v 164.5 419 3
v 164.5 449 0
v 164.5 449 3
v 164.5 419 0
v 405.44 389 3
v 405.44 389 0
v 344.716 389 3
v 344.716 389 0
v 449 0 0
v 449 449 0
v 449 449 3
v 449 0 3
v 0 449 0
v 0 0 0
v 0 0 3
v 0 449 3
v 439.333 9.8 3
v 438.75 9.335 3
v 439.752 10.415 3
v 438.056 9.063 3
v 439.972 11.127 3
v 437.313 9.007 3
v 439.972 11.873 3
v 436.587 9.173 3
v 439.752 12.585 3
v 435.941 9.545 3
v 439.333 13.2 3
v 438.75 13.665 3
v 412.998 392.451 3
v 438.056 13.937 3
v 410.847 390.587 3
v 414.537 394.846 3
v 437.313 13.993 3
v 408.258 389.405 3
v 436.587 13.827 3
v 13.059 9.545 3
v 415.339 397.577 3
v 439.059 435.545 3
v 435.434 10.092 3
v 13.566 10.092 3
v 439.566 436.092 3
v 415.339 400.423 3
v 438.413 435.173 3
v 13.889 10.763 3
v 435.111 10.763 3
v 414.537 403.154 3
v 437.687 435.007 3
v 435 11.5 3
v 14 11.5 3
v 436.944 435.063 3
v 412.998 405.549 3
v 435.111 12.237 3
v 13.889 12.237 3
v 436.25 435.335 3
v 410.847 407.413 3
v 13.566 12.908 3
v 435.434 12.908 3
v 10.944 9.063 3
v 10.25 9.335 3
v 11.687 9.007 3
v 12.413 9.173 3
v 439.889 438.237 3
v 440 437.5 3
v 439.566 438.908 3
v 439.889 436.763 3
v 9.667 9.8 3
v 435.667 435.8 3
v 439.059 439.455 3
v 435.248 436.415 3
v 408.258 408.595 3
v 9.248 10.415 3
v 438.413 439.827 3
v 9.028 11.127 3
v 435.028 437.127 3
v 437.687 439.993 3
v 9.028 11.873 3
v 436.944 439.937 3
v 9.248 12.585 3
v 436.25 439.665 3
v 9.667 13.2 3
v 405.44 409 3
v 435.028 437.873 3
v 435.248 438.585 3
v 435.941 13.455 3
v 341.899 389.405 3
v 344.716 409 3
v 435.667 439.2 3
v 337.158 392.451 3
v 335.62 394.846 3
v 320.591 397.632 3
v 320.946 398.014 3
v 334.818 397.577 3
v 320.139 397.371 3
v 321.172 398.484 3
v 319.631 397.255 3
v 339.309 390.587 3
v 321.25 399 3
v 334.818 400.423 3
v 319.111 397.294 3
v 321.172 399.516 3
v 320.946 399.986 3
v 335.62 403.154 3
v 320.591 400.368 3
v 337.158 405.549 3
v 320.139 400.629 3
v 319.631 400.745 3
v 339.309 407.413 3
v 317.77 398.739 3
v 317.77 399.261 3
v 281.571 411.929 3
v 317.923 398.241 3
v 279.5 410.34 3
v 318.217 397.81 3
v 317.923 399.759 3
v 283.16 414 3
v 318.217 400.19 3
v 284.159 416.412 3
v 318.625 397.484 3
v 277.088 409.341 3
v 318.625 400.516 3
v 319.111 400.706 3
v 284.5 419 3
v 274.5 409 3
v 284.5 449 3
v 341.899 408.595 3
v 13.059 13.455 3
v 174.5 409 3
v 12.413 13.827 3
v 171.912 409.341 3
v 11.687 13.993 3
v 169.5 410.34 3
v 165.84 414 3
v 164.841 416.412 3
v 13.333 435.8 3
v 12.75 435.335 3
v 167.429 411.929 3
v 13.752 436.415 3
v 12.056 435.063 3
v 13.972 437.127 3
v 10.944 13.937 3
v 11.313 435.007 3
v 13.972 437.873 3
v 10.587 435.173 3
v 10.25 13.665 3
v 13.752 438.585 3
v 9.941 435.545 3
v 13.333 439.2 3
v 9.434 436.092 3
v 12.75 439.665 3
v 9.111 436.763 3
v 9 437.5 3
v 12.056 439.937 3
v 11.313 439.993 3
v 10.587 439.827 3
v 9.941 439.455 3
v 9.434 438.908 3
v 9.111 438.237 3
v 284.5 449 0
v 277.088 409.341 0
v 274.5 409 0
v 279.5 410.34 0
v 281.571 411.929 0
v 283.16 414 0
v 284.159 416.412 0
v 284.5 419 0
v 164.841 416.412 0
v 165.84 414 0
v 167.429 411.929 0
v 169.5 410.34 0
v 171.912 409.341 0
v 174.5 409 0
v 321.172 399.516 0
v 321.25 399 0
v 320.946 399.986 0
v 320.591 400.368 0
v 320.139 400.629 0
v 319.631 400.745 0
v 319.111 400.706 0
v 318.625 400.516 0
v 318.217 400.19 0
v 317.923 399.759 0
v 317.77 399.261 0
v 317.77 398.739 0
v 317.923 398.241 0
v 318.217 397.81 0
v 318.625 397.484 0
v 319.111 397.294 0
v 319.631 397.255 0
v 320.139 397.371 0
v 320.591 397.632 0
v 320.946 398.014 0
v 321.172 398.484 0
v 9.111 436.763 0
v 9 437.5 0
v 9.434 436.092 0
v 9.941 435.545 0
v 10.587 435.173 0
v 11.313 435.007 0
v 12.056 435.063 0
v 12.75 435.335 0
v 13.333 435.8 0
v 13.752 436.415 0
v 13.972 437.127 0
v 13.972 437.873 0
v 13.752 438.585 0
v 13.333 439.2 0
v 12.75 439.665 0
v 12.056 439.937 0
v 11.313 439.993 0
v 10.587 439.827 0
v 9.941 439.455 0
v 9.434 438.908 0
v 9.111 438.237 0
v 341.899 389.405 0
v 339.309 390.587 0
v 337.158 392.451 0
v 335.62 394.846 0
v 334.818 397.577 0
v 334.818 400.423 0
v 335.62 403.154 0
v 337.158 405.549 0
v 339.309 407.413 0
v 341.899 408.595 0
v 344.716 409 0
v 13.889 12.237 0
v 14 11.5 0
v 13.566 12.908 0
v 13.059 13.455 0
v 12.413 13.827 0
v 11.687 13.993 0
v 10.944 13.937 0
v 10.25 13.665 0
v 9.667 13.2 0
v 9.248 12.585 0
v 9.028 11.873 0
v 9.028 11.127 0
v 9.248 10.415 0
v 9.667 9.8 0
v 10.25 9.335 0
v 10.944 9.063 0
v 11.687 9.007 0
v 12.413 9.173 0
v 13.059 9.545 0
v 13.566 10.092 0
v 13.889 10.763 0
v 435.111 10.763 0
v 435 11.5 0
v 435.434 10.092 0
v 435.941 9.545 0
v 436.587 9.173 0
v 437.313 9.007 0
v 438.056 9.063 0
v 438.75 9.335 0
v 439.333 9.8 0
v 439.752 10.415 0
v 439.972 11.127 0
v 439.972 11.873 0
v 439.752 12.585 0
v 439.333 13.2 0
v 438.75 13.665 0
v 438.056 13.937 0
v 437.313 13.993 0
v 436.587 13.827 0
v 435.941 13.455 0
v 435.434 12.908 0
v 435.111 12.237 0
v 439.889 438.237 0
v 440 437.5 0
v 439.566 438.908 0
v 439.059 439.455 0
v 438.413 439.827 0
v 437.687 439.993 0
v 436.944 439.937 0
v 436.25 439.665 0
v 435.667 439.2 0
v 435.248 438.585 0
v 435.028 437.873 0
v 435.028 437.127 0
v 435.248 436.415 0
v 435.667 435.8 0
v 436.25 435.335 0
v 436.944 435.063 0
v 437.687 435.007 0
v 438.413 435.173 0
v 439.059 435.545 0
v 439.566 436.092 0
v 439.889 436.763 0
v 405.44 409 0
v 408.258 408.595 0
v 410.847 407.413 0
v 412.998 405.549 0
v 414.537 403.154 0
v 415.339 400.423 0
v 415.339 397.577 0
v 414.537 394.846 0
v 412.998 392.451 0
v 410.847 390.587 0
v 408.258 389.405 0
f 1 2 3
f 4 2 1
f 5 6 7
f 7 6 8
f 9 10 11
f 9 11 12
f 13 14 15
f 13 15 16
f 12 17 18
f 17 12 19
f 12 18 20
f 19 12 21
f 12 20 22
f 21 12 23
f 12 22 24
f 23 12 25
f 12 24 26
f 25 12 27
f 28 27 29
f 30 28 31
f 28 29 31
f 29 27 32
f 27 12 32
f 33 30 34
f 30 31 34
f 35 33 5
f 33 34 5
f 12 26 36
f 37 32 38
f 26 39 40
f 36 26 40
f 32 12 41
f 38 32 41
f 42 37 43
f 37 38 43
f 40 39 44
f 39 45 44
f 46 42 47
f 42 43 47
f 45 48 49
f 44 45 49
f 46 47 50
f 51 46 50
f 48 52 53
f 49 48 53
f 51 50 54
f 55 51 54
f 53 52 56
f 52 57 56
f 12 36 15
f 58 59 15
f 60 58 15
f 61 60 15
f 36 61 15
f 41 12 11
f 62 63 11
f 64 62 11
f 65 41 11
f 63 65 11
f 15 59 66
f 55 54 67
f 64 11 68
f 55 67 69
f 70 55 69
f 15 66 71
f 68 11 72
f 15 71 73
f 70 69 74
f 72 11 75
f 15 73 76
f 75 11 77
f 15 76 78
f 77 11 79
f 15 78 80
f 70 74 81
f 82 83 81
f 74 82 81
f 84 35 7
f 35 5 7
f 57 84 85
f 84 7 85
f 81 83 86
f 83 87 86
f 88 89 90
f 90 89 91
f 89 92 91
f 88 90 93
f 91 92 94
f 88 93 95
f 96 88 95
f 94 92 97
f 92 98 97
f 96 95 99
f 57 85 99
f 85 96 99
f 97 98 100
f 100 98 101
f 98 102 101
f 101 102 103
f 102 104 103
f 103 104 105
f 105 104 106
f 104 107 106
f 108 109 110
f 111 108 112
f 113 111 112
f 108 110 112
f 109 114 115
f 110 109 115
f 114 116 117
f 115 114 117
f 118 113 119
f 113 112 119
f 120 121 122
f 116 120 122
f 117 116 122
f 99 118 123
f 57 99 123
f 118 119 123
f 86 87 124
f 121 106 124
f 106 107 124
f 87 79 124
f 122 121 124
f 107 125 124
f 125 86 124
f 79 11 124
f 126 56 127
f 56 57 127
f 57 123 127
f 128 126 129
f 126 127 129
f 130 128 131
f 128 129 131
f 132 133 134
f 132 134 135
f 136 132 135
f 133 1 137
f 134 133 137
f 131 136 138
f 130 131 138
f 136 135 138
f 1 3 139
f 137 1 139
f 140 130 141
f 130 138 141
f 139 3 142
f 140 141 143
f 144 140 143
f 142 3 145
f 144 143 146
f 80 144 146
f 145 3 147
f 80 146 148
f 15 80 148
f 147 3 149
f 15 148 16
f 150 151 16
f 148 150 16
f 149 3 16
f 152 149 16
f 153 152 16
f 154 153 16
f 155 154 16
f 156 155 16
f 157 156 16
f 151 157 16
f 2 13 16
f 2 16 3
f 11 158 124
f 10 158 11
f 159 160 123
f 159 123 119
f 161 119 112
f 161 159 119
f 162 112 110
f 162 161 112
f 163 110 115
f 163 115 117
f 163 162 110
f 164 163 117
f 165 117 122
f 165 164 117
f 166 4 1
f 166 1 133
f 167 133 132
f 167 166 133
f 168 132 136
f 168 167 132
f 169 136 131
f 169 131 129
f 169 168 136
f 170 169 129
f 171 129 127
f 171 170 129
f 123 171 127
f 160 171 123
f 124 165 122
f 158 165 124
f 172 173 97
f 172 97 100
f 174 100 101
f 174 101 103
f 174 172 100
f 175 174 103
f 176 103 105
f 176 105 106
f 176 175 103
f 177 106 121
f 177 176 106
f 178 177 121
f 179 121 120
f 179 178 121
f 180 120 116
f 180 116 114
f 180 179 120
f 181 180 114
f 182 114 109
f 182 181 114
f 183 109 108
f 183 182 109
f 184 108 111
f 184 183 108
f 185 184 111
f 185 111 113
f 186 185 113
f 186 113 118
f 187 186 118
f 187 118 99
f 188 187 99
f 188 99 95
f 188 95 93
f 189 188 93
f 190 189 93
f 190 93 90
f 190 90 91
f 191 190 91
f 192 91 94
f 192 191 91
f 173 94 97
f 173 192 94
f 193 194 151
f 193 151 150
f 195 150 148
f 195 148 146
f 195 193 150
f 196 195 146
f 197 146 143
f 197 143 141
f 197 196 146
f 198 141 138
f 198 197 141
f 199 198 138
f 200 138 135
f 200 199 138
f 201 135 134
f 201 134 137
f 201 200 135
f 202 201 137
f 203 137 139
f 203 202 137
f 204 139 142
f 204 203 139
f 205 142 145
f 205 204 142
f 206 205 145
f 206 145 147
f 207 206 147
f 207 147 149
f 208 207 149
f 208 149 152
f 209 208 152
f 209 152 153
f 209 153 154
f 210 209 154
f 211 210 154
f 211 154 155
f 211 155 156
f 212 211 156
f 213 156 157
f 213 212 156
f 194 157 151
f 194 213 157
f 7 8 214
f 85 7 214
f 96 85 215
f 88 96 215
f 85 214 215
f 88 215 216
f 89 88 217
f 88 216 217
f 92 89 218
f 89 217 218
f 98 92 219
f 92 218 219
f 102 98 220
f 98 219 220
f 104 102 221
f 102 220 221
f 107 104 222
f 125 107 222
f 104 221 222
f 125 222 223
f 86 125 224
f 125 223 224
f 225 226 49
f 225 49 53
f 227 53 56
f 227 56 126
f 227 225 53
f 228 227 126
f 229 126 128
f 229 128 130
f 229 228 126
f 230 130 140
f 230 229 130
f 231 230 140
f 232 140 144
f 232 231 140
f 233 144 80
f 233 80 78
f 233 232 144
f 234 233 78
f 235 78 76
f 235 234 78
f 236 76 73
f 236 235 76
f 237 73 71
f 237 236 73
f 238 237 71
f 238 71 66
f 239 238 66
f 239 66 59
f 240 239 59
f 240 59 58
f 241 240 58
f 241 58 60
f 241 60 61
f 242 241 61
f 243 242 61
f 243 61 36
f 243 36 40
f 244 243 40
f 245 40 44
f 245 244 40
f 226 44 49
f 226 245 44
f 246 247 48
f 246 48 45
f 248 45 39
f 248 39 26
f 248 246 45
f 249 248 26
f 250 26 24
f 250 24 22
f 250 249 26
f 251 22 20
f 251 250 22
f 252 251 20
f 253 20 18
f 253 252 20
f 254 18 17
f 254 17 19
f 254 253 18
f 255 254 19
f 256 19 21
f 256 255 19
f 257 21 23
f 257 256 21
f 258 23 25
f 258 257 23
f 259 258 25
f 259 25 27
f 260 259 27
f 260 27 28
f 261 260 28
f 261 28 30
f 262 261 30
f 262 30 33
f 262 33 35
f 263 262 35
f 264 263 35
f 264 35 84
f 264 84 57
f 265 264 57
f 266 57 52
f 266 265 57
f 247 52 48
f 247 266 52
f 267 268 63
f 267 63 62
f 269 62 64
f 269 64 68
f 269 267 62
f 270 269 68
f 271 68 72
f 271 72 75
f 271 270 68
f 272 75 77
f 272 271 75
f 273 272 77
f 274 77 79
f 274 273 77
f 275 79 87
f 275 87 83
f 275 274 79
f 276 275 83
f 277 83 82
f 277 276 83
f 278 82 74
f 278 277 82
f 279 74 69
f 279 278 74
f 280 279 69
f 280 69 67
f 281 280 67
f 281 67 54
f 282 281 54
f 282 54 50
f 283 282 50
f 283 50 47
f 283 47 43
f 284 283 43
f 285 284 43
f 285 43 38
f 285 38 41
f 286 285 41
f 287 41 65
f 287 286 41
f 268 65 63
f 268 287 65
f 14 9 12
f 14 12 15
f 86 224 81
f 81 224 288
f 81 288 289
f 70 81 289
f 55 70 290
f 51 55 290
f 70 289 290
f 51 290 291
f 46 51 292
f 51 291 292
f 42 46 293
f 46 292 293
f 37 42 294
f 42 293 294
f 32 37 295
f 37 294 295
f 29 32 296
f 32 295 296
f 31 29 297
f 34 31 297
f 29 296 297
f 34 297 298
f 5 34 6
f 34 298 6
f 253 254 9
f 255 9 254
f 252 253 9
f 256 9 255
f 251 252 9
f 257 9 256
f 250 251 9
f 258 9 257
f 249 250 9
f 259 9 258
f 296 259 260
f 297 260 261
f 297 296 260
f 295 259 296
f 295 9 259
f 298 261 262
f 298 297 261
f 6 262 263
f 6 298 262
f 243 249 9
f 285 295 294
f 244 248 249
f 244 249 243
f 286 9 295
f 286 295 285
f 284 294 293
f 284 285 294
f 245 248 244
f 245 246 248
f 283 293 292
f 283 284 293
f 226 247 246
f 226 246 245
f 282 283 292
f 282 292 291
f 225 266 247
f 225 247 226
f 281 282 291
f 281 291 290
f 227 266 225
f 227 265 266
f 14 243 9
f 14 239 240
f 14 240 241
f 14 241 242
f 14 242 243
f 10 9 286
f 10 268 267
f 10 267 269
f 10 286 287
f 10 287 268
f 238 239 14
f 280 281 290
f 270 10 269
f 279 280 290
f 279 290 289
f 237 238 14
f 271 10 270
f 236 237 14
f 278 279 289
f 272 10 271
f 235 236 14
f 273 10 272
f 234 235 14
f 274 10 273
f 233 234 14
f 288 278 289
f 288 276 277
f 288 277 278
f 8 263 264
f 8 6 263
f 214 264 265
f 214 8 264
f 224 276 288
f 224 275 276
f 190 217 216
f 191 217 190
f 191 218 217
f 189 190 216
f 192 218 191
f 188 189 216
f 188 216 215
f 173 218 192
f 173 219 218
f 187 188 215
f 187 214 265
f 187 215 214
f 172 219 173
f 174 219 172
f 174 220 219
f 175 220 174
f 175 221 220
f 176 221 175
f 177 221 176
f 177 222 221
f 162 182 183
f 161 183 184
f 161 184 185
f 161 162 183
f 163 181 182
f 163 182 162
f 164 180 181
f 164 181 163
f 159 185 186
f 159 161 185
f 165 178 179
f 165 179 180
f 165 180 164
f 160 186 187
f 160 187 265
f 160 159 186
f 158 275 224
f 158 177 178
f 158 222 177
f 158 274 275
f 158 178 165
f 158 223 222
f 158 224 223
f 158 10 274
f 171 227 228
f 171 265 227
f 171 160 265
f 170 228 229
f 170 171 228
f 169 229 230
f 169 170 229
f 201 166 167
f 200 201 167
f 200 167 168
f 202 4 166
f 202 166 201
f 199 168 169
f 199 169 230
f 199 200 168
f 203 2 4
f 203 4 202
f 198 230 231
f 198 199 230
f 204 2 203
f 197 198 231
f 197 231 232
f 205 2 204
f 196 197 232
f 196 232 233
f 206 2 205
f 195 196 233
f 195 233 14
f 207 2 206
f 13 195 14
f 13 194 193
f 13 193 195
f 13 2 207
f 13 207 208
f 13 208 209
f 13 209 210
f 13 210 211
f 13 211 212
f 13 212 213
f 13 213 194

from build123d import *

# Parameters (mm, degrees)
SCHIZZO1_R                   = 2.5
SCHIZZO1_R_2                 = 1.75
ESTRUSIONE_ESTRUSIONE1_DEPTH = 3


with BuildPart() as part:
    # Schizzo1 → Estrusione-Estrusione1 (new body)
    with BuildSketch(Plane.XY):
        with BuildLine():
            Line((0, 0), (0, 449))
            Line((0, 449), (164.5, 449))
            Line((164.5, 449), (164.5, 419))
            ThreePointArc((164.5, 419), (167.428932188, 411.928932188), (174.5, 409))
            Line((174.5, 409), (274.5, 409))
            ThreePointArc((274.5, 409), (281.571067812, 411.928932188), (284.5, 419))
            Line((284.5, 419), (284.5, 449))
            Line((284.5, 449), (449, 449))
            Line((449, 449), (449, 0))
            Line((449, 0), (0, 0))
        make_face()
        with Locations((11.5, 11.5)):
            Circle(SCHIZZO1_R, mode=Mode.SUBTRACT)
        with Locations(Location((437.5, 11.5, 0), (0, 0, 180))):
            Circle(SCHIZZO1_R, mode=Mode.SUBTRACT)
        with Locations((437.5, 437.5)):
            Circle(SCHIZZO1_R, mode=Mode.SUBTRACT)
        with Locations(Location((11.5, 437.5, 0), (0, 0, 180))):
            Circle(SCHIZZO1_R, mode=Mode.SUBTRACT)
        with Locations((319.5, 399)):
            Circle(SCHIZZO1_R_2, mode=Mode.SUBTRACT)
        with BuildLine():
            Line((344.715899345, 409), (405.440355678, 409))
            ThreePointArc((405.440355678, 409), (415.440355678, 399), (405.440355678, 389))
            Line((405.440355678, 389), (344.715899345, 389))
            ThreePointArc((344.715899345, 389), (334.715899345, 399), (344.715899345, 409))
        make_face(mode=Mode.SUBTRACT)
    extrude(amount=ESTRUSIONE_ESTRUSIONE1_DEPTH)


solid = part.part
